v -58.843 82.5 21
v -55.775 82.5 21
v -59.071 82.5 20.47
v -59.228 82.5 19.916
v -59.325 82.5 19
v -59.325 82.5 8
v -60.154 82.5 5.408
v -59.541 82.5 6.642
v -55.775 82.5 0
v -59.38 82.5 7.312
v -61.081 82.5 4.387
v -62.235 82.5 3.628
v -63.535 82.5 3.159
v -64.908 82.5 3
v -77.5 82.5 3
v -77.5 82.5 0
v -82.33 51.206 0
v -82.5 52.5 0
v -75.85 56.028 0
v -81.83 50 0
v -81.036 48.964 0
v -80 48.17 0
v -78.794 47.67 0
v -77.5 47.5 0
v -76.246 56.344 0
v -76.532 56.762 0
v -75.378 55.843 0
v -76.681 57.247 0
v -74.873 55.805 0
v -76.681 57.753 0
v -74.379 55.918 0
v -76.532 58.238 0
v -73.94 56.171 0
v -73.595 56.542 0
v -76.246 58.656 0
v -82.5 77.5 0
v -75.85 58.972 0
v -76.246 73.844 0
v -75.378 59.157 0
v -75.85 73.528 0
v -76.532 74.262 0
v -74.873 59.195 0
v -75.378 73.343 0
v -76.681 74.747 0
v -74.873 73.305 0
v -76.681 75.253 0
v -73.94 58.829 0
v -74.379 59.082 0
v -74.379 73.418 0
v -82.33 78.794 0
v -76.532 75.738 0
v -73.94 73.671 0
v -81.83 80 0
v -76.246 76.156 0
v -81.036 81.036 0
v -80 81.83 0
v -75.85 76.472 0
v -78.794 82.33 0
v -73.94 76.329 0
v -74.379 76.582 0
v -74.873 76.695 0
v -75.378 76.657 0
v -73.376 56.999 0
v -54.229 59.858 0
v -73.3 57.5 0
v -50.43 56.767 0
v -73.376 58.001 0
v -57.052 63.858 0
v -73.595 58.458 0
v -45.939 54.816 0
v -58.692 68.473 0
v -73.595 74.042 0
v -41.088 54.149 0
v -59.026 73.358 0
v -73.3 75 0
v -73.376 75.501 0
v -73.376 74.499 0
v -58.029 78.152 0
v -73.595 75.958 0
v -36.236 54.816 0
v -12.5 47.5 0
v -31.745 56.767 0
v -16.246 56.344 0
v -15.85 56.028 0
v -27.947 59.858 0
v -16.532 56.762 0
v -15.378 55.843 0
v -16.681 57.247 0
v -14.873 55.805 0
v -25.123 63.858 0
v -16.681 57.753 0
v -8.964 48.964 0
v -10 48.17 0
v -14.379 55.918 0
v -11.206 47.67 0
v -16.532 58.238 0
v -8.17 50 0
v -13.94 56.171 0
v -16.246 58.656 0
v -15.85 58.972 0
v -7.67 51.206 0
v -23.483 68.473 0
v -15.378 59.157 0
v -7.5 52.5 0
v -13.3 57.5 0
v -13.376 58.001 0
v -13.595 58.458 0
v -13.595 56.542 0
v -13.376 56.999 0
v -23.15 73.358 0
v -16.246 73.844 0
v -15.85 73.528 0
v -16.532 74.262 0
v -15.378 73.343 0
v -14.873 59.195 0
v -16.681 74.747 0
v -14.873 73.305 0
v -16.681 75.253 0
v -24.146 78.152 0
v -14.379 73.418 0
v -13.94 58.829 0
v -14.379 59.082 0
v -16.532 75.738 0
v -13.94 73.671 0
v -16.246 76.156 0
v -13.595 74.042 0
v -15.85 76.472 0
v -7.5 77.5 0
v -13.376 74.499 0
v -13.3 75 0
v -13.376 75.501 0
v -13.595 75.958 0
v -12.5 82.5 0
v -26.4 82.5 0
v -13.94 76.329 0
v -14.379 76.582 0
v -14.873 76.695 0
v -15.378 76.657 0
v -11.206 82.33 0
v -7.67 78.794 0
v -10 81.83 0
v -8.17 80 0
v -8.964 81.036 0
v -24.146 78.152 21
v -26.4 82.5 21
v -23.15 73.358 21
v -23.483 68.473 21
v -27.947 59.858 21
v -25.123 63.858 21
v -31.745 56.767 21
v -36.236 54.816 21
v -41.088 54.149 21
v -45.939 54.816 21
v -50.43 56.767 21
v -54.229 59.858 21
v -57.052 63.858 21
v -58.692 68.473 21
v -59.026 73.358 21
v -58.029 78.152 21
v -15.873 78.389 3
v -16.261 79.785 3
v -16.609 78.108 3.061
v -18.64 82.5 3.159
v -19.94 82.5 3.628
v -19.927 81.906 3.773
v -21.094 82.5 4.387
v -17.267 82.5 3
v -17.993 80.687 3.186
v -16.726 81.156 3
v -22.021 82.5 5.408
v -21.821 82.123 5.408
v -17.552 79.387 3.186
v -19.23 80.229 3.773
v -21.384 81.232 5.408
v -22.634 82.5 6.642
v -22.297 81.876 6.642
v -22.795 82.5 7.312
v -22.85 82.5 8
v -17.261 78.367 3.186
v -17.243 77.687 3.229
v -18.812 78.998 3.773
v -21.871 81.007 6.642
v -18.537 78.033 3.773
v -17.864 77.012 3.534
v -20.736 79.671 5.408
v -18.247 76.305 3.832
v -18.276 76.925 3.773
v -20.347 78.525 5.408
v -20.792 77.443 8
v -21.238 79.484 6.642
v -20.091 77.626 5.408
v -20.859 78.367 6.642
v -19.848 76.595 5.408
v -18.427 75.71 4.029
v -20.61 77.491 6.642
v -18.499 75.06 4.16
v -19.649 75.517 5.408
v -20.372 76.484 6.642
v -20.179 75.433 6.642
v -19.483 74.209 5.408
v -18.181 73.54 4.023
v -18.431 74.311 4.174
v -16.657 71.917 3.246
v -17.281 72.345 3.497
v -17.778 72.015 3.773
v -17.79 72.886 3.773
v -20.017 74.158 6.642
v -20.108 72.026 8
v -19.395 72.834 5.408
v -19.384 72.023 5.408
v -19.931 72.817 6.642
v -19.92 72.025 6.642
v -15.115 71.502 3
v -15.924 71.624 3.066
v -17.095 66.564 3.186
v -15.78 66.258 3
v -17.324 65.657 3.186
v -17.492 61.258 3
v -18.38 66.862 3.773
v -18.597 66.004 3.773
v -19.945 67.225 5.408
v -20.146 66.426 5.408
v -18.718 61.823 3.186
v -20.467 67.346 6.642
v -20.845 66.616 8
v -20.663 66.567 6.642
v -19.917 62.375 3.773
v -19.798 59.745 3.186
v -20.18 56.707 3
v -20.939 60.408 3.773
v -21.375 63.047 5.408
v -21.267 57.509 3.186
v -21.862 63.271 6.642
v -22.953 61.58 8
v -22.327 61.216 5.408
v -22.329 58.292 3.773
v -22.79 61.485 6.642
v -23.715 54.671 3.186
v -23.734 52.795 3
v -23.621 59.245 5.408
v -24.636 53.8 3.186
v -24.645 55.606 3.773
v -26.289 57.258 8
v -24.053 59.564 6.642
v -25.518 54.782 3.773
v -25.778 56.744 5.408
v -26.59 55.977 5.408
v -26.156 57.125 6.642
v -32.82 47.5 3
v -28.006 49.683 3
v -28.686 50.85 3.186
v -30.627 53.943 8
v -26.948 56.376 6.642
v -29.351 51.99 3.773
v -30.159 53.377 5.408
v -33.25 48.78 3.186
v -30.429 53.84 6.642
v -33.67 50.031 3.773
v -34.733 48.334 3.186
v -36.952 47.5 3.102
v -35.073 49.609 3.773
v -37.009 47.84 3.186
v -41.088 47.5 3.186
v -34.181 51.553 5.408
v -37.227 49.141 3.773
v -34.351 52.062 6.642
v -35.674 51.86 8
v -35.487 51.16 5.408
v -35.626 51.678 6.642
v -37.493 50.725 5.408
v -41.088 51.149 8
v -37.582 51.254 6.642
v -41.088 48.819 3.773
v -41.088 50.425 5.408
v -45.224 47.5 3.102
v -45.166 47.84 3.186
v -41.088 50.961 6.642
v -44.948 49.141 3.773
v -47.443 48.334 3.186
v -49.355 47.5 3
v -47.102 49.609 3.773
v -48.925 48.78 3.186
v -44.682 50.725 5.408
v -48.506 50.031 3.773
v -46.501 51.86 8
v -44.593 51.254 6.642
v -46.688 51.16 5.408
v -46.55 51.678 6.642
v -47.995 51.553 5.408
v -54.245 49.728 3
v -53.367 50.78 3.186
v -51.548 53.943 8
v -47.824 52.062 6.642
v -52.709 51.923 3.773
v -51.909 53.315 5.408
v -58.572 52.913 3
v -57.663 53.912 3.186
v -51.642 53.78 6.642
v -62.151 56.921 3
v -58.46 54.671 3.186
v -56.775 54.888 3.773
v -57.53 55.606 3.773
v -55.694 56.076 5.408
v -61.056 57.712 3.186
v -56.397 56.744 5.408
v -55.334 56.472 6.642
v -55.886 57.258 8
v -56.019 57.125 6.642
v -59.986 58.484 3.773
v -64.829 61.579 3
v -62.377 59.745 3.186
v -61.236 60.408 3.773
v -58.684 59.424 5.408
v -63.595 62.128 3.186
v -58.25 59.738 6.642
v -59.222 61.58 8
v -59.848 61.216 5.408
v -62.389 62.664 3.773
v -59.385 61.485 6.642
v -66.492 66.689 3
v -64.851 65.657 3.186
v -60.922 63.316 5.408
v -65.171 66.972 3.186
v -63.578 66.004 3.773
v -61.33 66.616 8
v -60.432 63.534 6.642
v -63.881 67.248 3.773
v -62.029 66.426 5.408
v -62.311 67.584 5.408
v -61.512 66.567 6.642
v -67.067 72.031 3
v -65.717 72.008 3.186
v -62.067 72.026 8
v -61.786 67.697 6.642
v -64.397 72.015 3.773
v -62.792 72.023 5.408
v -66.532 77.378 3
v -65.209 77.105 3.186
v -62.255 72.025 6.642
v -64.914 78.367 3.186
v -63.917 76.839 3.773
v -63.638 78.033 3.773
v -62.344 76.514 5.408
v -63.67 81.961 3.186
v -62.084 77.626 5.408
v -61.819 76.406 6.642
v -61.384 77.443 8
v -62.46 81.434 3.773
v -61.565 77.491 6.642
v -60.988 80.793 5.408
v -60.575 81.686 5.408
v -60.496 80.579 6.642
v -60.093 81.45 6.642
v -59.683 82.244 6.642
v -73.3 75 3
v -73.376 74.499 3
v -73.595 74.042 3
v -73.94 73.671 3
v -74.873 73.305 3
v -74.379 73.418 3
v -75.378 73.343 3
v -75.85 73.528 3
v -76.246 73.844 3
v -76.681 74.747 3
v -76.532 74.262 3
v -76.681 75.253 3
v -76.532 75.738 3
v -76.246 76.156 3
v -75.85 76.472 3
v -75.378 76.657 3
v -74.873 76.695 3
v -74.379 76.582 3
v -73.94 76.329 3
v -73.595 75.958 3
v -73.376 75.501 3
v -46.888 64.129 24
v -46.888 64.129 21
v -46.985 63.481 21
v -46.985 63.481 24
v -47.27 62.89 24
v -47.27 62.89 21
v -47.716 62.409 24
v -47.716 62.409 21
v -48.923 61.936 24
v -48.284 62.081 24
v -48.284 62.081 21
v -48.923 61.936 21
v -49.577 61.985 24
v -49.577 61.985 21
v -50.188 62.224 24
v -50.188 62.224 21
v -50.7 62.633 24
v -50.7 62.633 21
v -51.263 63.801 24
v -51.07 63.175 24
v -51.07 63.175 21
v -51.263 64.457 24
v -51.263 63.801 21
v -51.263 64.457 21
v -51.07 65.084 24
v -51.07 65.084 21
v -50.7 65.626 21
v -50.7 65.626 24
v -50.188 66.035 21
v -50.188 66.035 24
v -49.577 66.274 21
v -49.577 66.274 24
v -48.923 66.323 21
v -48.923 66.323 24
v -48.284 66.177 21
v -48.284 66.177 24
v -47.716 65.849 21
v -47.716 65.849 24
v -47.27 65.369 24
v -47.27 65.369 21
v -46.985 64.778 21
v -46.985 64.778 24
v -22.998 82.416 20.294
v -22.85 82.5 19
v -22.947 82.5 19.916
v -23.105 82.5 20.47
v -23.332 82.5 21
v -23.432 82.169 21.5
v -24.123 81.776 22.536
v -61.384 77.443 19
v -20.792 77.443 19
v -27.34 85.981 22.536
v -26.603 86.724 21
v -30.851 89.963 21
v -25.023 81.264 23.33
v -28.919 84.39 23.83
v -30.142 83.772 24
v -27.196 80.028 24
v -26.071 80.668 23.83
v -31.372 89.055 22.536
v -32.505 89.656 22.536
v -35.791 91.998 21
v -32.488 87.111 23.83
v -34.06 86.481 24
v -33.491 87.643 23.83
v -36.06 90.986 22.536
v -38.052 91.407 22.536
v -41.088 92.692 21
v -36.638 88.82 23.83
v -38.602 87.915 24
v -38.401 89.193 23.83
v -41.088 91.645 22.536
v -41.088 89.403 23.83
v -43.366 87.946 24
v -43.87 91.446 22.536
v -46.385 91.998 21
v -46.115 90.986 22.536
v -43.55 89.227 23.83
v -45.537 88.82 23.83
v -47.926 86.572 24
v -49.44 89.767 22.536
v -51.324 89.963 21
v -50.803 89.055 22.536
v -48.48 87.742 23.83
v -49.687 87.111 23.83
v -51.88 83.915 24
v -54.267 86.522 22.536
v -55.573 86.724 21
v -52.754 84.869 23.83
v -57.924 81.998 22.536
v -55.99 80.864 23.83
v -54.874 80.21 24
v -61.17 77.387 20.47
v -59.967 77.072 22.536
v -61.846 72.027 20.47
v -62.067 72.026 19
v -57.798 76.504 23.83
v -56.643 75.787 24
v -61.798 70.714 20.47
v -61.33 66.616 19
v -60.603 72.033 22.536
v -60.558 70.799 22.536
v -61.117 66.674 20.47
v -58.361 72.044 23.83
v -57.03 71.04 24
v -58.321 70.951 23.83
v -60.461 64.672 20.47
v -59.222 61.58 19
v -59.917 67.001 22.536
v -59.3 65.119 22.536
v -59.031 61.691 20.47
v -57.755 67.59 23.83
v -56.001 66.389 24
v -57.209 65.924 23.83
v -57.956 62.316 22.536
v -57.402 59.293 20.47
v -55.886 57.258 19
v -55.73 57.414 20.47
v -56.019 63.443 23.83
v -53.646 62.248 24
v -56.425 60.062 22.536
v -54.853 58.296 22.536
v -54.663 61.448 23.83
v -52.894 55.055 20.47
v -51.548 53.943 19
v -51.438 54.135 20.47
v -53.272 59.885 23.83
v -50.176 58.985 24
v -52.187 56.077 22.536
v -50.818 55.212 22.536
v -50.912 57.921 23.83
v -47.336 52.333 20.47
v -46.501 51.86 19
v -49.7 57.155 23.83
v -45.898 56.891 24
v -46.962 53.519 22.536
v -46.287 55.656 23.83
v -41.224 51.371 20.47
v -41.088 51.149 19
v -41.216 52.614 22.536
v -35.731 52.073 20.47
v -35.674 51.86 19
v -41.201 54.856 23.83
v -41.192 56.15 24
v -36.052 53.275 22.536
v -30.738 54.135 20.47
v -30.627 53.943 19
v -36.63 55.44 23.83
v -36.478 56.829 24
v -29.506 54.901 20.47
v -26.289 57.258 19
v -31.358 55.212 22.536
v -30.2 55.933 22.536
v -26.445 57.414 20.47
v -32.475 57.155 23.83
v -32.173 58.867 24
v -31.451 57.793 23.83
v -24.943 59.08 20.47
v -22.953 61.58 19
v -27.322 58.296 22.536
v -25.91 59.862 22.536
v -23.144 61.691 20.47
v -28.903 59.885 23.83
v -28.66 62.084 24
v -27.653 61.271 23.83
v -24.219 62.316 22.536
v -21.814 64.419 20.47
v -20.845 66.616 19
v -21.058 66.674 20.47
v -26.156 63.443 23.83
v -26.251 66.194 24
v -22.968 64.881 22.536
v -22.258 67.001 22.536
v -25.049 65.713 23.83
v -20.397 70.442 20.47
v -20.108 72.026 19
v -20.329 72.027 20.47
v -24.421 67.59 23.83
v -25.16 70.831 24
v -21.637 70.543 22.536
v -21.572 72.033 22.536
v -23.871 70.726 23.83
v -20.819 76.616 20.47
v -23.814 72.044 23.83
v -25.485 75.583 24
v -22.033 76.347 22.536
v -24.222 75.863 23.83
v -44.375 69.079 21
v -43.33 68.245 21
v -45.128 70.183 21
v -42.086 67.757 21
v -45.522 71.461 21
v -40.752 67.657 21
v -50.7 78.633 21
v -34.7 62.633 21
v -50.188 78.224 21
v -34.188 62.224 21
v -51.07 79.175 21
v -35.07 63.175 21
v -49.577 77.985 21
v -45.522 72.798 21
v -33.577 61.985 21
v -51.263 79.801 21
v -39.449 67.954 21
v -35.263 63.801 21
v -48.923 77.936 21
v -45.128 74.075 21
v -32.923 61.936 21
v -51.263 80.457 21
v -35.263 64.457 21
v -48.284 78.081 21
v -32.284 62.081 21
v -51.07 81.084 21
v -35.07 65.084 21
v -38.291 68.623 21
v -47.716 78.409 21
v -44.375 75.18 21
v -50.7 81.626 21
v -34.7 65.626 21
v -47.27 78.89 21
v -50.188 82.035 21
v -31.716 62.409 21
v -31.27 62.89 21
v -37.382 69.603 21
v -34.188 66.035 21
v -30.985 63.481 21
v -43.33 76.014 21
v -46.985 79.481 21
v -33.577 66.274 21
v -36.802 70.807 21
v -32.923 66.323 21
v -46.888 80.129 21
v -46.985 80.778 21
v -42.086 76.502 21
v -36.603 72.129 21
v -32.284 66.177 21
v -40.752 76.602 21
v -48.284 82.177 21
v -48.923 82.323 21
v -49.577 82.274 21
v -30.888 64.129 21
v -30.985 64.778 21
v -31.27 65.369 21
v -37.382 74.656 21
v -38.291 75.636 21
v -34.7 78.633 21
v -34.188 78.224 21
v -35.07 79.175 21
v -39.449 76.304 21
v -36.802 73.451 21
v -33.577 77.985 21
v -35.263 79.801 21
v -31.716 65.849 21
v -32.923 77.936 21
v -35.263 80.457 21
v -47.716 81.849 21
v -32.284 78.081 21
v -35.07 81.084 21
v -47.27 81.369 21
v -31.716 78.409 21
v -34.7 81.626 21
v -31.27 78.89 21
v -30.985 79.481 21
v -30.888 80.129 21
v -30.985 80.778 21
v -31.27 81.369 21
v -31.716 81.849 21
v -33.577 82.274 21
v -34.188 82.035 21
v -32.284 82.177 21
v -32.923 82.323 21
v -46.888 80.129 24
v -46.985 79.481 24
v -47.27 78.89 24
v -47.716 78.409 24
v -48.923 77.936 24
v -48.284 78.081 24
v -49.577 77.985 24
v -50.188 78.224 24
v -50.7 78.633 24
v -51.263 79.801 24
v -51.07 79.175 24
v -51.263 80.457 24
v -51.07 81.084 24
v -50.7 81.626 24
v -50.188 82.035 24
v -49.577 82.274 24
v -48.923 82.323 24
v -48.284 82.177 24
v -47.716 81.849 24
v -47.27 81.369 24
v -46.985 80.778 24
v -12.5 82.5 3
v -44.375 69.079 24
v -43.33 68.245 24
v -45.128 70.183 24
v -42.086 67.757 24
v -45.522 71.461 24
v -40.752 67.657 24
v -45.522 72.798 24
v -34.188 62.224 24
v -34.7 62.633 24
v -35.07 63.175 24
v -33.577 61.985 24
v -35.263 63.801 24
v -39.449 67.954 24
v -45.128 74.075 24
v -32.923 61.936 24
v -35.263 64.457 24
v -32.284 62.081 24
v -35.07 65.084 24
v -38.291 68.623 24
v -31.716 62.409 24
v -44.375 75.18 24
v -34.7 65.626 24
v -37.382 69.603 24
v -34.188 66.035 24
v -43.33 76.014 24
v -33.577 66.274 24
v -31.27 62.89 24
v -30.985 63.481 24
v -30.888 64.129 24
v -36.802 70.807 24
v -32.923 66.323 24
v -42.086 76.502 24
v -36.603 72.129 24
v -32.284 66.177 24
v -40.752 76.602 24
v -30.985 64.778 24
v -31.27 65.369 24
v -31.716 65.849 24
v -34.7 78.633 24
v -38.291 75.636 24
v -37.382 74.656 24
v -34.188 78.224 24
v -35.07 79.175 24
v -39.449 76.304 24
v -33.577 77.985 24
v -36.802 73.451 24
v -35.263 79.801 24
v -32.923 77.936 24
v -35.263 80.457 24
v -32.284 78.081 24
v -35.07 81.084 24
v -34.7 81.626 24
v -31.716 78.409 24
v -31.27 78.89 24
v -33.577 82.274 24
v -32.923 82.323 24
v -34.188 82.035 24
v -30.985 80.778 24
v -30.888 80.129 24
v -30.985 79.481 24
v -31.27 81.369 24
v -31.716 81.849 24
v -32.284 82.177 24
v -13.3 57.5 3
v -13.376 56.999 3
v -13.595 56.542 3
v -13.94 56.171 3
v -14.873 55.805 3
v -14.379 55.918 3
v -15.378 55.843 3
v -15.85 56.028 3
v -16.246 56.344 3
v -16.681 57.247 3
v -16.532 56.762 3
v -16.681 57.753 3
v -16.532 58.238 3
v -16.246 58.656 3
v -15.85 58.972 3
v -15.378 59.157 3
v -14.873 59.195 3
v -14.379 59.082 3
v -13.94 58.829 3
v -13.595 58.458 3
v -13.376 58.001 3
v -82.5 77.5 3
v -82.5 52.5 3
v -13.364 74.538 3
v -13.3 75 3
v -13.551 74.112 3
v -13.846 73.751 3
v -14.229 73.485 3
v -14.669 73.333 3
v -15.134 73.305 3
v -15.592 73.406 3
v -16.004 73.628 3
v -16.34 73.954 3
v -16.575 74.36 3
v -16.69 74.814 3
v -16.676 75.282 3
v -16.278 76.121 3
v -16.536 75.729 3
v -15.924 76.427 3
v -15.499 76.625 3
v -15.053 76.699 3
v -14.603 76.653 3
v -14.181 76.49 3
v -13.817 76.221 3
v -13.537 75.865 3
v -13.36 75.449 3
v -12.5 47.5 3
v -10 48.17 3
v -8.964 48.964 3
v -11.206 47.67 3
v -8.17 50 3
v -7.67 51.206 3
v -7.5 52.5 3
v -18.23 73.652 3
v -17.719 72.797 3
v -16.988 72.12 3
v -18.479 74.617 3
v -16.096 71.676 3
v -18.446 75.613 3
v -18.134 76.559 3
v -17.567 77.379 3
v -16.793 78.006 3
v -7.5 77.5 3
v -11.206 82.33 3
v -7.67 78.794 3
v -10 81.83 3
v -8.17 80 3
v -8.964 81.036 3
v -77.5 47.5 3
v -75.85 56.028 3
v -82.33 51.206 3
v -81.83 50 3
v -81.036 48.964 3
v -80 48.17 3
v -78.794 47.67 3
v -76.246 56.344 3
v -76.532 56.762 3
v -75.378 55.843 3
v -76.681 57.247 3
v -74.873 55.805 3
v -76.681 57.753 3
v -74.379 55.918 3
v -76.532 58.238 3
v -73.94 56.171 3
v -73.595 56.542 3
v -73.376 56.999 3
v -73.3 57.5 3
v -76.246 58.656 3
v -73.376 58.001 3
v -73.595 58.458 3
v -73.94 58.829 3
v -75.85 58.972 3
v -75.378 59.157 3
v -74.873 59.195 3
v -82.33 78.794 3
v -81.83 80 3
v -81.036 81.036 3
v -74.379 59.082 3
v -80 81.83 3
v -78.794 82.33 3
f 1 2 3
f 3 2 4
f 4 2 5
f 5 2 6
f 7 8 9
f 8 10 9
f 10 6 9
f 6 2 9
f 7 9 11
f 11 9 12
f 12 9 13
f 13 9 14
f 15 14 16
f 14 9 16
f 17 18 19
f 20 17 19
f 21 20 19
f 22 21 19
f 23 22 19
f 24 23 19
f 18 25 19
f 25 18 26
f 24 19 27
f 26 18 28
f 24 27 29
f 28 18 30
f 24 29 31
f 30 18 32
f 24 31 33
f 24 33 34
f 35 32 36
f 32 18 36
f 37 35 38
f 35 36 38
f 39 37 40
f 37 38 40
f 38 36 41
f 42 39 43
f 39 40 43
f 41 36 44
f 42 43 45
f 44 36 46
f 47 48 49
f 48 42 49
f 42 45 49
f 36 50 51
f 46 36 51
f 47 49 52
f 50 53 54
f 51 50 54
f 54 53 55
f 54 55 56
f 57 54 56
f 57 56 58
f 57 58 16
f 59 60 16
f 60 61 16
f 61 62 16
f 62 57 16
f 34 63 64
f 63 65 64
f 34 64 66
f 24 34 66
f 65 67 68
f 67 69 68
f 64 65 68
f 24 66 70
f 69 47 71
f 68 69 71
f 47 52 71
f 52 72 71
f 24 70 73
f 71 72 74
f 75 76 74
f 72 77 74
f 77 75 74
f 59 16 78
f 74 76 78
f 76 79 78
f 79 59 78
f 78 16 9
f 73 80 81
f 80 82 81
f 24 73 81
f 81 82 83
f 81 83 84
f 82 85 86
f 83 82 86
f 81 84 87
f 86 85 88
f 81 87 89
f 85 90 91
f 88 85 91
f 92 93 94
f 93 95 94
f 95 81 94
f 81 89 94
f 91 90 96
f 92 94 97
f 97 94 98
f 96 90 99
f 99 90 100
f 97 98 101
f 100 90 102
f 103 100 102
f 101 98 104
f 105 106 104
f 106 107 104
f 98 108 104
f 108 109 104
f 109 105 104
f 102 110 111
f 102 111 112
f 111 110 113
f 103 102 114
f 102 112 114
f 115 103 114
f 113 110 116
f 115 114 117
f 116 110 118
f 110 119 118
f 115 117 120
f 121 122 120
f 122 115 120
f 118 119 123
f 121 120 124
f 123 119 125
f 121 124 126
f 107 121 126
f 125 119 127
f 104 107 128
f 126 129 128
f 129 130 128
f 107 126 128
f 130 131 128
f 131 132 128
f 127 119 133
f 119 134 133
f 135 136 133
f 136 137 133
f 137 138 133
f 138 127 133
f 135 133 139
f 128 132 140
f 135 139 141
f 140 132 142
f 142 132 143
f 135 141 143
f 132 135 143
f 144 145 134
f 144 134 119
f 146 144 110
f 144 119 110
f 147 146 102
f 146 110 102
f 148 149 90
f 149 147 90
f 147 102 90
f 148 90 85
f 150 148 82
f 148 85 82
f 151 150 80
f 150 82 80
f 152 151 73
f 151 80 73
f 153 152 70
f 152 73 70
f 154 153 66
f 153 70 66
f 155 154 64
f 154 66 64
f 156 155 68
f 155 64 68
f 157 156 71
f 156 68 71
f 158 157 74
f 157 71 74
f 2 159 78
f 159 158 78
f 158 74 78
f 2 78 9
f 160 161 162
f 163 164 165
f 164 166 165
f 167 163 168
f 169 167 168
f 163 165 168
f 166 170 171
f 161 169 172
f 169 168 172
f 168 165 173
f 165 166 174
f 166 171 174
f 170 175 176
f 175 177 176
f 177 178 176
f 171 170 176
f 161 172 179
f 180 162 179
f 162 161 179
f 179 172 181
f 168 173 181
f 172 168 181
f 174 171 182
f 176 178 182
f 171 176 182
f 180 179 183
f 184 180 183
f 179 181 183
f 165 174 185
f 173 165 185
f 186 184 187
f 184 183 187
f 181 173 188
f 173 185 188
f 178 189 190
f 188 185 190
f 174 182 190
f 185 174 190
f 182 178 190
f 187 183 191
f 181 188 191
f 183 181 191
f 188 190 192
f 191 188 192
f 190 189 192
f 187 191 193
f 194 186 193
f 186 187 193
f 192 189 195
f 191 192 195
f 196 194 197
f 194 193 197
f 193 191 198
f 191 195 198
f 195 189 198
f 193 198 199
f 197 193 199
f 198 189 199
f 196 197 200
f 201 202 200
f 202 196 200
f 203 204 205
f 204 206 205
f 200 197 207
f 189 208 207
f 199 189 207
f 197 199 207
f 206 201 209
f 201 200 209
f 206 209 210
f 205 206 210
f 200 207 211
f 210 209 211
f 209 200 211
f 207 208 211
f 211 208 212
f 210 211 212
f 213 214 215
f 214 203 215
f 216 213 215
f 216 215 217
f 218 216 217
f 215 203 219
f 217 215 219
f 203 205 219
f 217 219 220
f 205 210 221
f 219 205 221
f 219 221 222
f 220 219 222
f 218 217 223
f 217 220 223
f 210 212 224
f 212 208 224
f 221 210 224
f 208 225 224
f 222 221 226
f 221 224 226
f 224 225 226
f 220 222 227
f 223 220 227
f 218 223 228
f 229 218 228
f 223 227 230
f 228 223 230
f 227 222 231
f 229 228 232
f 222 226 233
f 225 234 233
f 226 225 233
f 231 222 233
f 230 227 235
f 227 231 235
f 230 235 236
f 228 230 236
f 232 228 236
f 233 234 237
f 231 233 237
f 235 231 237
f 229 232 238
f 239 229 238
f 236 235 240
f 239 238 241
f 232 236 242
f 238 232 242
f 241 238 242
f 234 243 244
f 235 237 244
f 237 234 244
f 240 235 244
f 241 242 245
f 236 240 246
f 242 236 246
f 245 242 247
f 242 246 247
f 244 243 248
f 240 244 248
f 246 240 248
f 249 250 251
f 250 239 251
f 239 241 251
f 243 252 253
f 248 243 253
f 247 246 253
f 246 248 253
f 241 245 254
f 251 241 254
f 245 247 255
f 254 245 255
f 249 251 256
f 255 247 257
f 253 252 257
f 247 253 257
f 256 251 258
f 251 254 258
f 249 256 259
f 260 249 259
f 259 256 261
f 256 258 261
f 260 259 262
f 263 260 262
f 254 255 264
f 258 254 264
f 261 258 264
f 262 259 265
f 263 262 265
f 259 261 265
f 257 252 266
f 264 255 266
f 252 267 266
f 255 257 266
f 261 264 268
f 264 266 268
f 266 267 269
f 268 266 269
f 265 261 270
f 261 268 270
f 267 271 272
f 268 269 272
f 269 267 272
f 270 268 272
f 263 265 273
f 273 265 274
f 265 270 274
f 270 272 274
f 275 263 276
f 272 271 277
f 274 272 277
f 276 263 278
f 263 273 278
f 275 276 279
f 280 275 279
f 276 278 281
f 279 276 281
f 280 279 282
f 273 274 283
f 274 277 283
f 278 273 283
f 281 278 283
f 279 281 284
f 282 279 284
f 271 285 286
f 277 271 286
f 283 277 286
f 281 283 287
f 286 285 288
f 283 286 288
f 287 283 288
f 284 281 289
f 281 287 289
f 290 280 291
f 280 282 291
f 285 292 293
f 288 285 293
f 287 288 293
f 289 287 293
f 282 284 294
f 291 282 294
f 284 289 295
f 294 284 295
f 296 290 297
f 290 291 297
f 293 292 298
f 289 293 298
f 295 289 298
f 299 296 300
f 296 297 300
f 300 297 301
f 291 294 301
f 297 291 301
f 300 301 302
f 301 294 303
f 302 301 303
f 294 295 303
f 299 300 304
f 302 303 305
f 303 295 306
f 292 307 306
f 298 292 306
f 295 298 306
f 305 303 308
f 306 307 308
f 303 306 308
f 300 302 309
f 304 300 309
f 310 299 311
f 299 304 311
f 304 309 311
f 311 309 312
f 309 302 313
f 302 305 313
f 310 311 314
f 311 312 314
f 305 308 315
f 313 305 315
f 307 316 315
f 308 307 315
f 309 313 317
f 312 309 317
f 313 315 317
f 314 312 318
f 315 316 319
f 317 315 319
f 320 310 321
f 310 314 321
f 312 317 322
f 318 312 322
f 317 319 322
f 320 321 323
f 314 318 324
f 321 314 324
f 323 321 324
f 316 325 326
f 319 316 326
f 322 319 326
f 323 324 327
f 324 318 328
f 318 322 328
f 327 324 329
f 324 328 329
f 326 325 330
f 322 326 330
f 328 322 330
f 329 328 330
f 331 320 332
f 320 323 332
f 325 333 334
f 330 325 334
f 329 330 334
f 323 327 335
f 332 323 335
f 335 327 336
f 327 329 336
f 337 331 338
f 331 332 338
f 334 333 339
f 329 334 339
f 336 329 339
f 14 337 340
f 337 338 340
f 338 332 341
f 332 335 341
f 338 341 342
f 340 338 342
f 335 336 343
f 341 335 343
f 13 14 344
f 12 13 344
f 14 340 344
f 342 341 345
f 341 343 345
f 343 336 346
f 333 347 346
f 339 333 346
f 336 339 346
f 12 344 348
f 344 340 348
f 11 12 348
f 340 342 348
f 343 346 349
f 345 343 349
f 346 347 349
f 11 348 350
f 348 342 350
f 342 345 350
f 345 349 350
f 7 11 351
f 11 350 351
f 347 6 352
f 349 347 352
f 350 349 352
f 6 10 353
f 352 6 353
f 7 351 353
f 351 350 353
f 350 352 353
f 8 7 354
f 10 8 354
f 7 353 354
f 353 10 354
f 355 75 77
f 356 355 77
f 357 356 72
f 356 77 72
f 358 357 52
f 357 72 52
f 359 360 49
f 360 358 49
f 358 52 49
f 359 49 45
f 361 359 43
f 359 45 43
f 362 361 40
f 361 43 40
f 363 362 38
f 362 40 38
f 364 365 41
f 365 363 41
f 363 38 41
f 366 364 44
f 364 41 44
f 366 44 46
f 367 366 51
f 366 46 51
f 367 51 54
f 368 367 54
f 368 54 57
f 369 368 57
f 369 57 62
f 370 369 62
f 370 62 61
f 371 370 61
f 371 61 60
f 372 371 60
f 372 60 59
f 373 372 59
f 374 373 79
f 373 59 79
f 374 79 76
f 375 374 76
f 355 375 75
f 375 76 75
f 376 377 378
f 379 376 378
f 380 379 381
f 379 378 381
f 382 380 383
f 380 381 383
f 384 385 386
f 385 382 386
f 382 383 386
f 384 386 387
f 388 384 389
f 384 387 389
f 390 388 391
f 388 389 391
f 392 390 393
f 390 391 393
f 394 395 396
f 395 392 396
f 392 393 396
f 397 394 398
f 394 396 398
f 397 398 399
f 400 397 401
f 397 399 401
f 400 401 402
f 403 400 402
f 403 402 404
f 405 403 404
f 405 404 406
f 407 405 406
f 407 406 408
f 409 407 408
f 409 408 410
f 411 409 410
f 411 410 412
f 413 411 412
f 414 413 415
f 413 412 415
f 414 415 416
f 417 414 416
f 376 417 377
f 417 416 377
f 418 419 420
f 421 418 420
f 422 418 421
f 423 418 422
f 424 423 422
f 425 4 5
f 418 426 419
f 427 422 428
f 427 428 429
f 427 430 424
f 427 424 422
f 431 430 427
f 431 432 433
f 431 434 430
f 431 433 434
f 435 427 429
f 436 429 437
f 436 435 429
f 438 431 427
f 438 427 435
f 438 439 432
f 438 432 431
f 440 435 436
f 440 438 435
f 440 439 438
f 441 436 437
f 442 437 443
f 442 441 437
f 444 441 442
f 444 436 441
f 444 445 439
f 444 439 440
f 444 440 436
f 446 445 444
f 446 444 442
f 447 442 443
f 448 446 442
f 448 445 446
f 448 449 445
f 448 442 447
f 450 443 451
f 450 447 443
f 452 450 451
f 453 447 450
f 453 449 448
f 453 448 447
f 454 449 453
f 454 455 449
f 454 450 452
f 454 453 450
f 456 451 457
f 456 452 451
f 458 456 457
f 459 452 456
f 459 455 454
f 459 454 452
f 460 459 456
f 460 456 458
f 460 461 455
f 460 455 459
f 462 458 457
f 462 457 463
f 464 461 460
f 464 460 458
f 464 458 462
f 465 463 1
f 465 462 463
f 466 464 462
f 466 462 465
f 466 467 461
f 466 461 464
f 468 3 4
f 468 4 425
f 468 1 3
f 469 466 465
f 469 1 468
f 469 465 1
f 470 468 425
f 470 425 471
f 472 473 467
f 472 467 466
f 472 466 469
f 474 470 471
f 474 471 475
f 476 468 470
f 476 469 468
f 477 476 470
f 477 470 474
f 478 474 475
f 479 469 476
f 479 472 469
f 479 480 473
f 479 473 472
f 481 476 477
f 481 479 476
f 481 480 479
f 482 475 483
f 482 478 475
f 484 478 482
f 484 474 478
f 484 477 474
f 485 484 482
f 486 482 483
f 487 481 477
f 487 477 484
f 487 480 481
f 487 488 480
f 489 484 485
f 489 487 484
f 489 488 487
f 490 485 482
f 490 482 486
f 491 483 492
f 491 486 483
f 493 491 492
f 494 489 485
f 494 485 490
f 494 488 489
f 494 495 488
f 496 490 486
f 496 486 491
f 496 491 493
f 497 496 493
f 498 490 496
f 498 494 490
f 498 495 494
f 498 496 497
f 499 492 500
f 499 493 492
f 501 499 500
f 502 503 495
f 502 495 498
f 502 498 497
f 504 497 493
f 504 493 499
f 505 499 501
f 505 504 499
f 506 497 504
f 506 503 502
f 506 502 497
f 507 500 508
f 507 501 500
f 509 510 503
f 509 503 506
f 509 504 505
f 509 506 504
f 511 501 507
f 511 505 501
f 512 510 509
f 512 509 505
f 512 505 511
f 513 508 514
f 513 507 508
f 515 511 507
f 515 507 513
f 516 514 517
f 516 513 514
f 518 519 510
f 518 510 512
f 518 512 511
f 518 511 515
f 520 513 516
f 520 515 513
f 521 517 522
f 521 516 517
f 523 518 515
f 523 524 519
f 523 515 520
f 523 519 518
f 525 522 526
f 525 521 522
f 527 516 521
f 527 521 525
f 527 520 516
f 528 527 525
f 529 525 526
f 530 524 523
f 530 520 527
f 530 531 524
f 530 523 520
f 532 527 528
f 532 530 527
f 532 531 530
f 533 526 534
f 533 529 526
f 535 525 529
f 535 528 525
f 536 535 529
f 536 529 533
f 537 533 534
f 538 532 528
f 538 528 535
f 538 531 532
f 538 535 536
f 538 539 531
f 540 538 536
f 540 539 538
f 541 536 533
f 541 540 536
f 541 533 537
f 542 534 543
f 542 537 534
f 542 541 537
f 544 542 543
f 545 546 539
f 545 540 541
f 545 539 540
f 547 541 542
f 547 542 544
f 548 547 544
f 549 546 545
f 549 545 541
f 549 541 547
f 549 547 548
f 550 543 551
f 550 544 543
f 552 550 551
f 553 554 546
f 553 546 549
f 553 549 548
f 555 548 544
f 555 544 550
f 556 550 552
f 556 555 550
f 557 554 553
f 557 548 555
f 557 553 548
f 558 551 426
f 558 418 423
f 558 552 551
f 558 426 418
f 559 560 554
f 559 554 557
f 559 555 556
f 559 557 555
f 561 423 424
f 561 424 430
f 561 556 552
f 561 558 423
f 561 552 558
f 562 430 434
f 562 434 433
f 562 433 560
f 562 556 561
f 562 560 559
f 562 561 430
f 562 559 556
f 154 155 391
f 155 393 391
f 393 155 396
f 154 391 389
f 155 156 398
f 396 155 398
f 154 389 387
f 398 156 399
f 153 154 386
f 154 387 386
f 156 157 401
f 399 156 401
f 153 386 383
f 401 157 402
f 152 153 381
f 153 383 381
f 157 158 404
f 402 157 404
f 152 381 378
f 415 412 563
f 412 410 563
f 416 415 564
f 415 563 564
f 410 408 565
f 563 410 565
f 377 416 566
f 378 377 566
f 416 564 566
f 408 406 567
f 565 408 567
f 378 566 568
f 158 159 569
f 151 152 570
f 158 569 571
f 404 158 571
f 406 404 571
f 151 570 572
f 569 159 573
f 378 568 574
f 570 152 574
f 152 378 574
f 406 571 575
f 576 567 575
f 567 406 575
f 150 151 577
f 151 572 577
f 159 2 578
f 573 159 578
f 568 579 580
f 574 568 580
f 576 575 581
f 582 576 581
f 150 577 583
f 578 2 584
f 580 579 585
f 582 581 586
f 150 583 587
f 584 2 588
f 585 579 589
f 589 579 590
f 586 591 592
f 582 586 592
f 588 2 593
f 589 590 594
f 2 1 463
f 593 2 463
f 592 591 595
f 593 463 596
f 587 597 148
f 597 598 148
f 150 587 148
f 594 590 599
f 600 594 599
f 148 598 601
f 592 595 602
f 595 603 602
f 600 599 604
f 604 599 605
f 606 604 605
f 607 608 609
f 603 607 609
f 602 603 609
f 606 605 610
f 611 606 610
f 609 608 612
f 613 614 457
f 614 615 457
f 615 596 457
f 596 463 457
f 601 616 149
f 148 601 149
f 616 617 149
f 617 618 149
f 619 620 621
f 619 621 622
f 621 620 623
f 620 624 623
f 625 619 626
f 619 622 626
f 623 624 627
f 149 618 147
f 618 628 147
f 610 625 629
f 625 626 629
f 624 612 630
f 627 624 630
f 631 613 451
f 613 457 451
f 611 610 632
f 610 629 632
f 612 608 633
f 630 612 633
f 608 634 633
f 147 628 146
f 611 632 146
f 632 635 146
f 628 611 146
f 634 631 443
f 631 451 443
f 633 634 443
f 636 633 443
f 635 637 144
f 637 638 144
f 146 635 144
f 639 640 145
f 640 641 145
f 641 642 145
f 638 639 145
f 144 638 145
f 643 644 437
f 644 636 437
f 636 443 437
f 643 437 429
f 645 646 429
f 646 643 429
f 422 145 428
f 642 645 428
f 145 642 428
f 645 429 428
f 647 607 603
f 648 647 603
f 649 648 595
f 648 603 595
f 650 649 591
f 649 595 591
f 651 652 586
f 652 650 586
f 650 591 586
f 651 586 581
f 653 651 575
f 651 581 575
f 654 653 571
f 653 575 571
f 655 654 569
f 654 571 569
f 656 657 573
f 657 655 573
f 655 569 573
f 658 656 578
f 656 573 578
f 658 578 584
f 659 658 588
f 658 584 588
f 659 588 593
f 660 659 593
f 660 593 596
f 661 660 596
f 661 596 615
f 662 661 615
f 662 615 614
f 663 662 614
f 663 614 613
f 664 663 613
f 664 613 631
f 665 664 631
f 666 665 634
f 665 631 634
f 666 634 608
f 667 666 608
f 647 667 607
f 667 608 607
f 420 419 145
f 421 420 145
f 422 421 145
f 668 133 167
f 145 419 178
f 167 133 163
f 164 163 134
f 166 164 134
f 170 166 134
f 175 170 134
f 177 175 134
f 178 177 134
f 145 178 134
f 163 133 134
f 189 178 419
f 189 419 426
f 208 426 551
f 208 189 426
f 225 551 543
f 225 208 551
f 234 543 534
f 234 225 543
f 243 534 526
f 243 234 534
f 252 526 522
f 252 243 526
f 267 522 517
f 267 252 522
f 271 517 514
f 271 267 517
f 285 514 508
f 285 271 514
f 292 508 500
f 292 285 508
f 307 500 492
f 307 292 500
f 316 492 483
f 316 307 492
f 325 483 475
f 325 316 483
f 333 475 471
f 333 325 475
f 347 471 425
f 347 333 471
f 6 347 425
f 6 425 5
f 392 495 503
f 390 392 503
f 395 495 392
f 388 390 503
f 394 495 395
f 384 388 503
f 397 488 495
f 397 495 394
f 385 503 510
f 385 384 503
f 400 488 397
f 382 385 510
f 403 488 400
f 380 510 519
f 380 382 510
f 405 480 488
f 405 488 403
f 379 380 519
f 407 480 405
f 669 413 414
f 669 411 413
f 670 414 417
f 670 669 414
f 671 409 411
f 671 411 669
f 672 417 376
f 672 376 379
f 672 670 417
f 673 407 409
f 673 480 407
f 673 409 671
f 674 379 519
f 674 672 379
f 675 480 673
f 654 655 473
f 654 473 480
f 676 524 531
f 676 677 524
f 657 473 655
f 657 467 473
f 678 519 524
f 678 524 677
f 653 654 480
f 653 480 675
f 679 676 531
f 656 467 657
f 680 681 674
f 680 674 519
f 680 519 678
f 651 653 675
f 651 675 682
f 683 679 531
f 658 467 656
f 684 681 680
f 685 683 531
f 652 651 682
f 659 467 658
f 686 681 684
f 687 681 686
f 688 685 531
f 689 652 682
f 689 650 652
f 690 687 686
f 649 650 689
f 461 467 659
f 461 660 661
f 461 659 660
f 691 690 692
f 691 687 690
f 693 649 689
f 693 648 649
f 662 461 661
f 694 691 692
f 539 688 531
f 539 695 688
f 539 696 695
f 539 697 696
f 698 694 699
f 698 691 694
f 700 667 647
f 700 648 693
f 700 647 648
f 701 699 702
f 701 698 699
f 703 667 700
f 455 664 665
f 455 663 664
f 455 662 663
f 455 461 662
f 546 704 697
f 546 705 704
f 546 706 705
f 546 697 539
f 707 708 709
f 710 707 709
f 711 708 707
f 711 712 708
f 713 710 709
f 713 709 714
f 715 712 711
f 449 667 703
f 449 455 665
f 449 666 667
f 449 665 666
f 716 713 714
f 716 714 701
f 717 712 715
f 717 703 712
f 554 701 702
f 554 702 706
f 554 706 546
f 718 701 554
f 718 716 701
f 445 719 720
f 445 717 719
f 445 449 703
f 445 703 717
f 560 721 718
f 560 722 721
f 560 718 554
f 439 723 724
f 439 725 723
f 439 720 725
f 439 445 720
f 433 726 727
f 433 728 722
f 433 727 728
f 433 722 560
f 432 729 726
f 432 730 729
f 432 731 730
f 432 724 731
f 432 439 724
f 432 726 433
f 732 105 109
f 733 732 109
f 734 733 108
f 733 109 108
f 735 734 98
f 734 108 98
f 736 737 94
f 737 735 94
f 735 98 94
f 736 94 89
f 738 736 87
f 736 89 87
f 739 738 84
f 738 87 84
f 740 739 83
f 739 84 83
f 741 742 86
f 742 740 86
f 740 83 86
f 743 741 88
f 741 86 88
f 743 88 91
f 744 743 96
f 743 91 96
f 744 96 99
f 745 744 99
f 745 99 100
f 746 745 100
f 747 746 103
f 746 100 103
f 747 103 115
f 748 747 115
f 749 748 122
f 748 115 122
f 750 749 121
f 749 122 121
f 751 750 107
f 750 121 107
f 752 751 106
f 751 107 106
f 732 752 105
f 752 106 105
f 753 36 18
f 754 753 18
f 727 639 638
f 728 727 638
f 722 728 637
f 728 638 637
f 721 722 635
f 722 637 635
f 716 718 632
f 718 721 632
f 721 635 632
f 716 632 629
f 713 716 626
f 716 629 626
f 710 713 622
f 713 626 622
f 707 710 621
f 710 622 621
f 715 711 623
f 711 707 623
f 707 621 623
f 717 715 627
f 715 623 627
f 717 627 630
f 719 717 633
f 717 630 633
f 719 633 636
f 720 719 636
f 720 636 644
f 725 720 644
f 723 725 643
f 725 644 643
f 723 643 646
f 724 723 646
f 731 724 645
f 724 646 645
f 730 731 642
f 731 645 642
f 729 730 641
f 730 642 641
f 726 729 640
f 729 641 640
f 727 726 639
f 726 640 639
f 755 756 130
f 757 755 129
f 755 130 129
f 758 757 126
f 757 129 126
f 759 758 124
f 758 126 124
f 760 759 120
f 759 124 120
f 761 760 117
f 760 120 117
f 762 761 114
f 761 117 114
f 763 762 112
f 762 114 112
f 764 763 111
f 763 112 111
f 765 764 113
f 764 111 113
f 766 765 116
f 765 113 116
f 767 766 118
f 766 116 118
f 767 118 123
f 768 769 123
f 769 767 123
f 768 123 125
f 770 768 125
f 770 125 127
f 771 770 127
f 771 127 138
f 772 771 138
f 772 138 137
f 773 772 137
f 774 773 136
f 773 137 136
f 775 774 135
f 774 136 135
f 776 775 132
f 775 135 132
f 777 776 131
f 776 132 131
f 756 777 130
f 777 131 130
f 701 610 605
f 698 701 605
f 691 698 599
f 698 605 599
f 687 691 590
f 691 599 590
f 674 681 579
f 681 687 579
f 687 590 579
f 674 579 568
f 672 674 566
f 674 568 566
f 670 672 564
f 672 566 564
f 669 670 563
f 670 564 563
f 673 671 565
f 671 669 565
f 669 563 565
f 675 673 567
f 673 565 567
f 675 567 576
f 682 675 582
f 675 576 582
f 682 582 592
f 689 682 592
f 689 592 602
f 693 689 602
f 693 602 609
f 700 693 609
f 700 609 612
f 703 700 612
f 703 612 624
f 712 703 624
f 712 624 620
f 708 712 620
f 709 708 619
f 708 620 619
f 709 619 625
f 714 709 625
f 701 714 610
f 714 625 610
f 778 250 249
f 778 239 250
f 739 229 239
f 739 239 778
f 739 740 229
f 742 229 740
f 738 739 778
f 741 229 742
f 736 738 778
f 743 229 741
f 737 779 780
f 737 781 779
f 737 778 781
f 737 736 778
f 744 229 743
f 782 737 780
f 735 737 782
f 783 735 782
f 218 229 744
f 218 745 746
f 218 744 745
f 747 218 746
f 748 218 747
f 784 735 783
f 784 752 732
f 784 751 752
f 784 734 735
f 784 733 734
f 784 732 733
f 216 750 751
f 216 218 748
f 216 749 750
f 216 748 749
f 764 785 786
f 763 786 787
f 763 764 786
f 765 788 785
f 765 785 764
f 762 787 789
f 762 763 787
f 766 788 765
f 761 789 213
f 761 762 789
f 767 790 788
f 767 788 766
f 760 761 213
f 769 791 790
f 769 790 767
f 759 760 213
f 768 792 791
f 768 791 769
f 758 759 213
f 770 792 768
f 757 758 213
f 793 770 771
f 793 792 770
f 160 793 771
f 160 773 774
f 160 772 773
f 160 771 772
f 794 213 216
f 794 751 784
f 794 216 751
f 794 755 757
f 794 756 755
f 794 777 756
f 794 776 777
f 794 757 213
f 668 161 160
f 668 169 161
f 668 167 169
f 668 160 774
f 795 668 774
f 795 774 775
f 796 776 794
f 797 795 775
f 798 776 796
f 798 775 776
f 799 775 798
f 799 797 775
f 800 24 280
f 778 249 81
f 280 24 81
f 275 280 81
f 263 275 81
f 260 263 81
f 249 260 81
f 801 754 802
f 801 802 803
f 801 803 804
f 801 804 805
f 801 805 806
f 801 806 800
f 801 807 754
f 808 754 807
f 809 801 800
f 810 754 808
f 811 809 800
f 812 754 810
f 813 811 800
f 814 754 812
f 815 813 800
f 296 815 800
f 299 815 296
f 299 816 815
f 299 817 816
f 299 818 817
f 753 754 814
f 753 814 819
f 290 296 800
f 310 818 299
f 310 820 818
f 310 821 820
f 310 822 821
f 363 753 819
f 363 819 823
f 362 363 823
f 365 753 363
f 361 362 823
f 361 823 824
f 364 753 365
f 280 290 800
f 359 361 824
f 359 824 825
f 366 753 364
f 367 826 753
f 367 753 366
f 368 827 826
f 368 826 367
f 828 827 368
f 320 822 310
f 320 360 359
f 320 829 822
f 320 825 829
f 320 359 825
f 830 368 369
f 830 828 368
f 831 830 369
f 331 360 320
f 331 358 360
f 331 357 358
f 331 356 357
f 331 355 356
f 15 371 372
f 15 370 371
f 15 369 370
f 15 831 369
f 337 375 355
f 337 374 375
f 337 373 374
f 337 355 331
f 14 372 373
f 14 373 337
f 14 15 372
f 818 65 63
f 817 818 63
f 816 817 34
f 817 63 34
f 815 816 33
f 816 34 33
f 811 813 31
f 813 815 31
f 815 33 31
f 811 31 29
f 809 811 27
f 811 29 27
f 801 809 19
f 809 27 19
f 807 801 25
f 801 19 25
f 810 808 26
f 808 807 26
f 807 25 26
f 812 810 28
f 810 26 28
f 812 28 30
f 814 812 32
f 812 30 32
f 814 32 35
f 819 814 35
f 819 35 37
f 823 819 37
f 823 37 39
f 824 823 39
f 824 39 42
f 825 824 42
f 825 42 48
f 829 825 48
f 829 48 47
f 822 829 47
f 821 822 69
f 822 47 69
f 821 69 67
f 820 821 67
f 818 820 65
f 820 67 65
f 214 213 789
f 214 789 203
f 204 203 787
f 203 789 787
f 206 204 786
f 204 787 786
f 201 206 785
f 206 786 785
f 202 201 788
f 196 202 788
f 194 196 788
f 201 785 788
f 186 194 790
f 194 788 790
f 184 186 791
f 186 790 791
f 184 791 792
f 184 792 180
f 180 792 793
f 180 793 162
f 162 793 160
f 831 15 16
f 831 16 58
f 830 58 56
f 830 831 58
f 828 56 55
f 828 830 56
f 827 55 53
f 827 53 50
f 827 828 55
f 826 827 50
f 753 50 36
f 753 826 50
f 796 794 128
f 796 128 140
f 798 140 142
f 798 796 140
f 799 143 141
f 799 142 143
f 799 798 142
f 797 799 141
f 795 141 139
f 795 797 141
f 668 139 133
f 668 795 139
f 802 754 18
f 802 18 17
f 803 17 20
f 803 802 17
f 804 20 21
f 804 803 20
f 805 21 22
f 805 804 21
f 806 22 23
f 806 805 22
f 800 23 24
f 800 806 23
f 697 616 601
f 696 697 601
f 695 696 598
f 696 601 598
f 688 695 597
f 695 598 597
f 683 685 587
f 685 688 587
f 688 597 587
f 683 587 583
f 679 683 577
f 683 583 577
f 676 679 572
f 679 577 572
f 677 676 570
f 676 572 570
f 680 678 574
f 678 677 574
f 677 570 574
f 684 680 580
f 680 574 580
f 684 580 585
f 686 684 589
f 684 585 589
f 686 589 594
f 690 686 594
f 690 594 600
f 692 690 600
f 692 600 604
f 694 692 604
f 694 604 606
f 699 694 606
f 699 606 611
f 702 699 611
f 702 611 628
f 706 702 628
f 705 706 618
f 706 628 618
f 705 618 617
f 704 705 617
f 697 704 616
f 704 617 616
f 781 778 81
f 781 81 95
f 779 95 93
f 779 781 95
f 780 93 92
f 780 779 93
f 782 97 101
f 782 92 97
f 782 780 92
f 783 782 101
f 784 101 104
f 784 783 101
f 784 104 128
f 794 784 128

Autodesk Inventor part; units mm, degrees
ref_plane "YZ Plane" through (0, 0, 0) normal (1, 0, 0) x (0, 1, 0)
ref_plane "XZ Plane" through (0, 0, 0) normal (0, 1, 0) x (-1, 0, 0)
sketch "Sketch1" plane through (0, 0, 0) normal (0, 0, 1) x (1, 0, 0)
  circle A0 centre (-15, 75) radius 1.7
  circle A1 centre (-15, 57.5) radius 1.7
  circle A2 centre (-75, 75) radius 1.7
  circle A3 centre (-75, 57.5) radius 1.7
  line L0 (-67.5, 62.5) -> (-67.5, 82.5)
  arc A4 (-67.5, 62.5) -> (-57.5, 52.5) centre (-57.5, 62.5) ccw
  line L1 (-32.5, 52.5) -> (-57.5, 52.5)
  arc A5 (-32.5, 52.5) -> (-22.5, 62.5) centre (-32.5, 62.5) ccw
  line L2 (-22.5, 82.5) -> (-22.5, 62.5)
  line L3 (-7.5, 82.5) -> (-22.5, 82.5)
  line L4 (-7.5, 62.5) -> (-7.5, 82.5)
  line L5 (-67.5, 82.5) -> (-82.5, 82.5)
  line L6 (-82.5, 82.5) -> (-82.5, -37.5)
  line L7 (-82.5, 52.5) -> (-57.5, 52.5)
  line L8 (-32.5, 52.5) -> (-7.5, 52.5)
  line L9 (-7.5, 52.5) -> (-7.5, 62.5)
  circle A6 centre (-41.087567, 72.129389) radius 17.98
  line L10 (-67.5, 82.5) -> (-55.775345, 82.5)
  line L11 (-22.5, 82.5) -> (-26.399789, 82.5)
  line L12 (-7.5, 52.5) -> (-82.5, 52.5)
  line L13 (-82.5, 52.5) -> (-82.5, 47.5)
  line L14 (-82.5, 47.5) -> (-7.5, 47.5)
  line L15 (-7.5, 47.5) -> (-7.5, 52.5)
  point P0 (0, 0)
  point P1 (-22.296102, 67.952867)
  dimension "d2" = 5
extrude "Extrusion1" add sketch "Sketch1" along normal blind 3 contours A4 L7 L6 L5 L0 | L0 L10 A6 L11 L2 A5 L1 A4 | L1 L8 L15 L14 L6 L7 | A5 L2 L3 L4 L9 L8
sketch "Sketch2" plane through (0, 0, 3) normal (0, 0, 1) x (1, 0, 0)
  circle A0 centre (-41.087567, 72.129389) radius 17.98
  line L0 (-55.775345, 82.5) -> (-82.5, 82.5)
  line L1 (-7.5, 82.5) -> (-26.399789, 82.5)
  circle A1 centre (-41.087567, 72.129389) radius 20.98
  point P0 (0, 0)
  point P1 (-59.325188, 82.5)
  point P2 (-22.849946, 82.5)
  dimension "d3" = 3
ref_plane "Work Plane1" through (-53.798179, 52.016597, 21) normal (0, 0, 1) x (0.817541, 0.5758704, 0)
extrude "Extrusion2" add sketch "Sketch2" along normal up to surface (18 mm away) contours A0 L1 A1 L0 picked at (-21.478975, 69.046328)
sketch "Sketch3" plane through (-41.087567, 72.129389, 21) normal (0, 0, 1) x (1, 0, 0)
  arc A0 (-18.237621, 10.370611) -> (18.237621, 10.370611) centre (0, 0) ccw
  circle A1 centre (0, 0) radius 4.485
  arc A2 (-14.687778, 10.370611) -> (14.687778, 10.370611) centre (0, 0) ccw construction
  line L0 (0, 0) -> (11.25, 0) construction
  line L1 (8, 0) -> (8, -8) construction
  line L2 (0, 0) -> (0, -11.25) construction
  circle A3 centre (8, -8) radius 2.2
  circle A4 centre (-8, -8) radius 2.2
  circle A5 centre (0, 0) radius 20.98
  circle A6 centre (8, 8) radius 2.2
  circle A7 centre (-8, 8) radius 2.2
  point P0 (41.087567, -72.129389)
  point P1 (18.237621, 10.370611)
  point P2 (-18.237621, 10.370611)
  dimension "d6" = 8
  dimension "d7" = 4.4
  dimension "d20" = 16
  dimension "d21" = 8
extrude "Extrusion3" add sketch "Sketch3" along normal blind 3
fillet "Fillet1" radius 5 4 edges at (-82.5, 82.5, 1.5) (-82.5, 47.5, 1.5) (-7.5, 47.5, 1.5) (-7.5, 82.5, 1.5)
fillet "Fillet2" radius 5 1 edges at (-41.0876, 51.1494, 3)
fillet "Fillet3" radius 5 1 edges at (-59.3252, 61.7588, 24)
sketch "Sketch4" plane through (0, 0, 3) normal (0, 0, 1) x (1, 0, 0)
  circle A0 centre (-15, 57.5) radius 1.7
  arc A1 (-15.134193, 73.305305) -> (-15.499481, 76.624967) centre (-15, 75) ccw
  circle A2 centre (-75, 75) radius 1.7
  circle A3 centre (-75, 57.5) radius 1.7
  circle A4 centre (-15, 57.5) radius 3.5
  circle A5 centre (-75, 57.5) radius 3.5
  circle A6 centre (-75, 75) radius 3.5
  circle A7 centre (-15, 75) radius 1.7
  circle A8 centre (-15, 75) radius 3.5
  point P0 (0, 0)
  dimension "d13" = 7
  dimension "d14" = 7
  dimension "d15" = 7
  dimension "d16" = 7
extrude "Extrusion4" cut sketch "Sketch4" along normal blind 3
properties part number "Rex Motor Bracket"
